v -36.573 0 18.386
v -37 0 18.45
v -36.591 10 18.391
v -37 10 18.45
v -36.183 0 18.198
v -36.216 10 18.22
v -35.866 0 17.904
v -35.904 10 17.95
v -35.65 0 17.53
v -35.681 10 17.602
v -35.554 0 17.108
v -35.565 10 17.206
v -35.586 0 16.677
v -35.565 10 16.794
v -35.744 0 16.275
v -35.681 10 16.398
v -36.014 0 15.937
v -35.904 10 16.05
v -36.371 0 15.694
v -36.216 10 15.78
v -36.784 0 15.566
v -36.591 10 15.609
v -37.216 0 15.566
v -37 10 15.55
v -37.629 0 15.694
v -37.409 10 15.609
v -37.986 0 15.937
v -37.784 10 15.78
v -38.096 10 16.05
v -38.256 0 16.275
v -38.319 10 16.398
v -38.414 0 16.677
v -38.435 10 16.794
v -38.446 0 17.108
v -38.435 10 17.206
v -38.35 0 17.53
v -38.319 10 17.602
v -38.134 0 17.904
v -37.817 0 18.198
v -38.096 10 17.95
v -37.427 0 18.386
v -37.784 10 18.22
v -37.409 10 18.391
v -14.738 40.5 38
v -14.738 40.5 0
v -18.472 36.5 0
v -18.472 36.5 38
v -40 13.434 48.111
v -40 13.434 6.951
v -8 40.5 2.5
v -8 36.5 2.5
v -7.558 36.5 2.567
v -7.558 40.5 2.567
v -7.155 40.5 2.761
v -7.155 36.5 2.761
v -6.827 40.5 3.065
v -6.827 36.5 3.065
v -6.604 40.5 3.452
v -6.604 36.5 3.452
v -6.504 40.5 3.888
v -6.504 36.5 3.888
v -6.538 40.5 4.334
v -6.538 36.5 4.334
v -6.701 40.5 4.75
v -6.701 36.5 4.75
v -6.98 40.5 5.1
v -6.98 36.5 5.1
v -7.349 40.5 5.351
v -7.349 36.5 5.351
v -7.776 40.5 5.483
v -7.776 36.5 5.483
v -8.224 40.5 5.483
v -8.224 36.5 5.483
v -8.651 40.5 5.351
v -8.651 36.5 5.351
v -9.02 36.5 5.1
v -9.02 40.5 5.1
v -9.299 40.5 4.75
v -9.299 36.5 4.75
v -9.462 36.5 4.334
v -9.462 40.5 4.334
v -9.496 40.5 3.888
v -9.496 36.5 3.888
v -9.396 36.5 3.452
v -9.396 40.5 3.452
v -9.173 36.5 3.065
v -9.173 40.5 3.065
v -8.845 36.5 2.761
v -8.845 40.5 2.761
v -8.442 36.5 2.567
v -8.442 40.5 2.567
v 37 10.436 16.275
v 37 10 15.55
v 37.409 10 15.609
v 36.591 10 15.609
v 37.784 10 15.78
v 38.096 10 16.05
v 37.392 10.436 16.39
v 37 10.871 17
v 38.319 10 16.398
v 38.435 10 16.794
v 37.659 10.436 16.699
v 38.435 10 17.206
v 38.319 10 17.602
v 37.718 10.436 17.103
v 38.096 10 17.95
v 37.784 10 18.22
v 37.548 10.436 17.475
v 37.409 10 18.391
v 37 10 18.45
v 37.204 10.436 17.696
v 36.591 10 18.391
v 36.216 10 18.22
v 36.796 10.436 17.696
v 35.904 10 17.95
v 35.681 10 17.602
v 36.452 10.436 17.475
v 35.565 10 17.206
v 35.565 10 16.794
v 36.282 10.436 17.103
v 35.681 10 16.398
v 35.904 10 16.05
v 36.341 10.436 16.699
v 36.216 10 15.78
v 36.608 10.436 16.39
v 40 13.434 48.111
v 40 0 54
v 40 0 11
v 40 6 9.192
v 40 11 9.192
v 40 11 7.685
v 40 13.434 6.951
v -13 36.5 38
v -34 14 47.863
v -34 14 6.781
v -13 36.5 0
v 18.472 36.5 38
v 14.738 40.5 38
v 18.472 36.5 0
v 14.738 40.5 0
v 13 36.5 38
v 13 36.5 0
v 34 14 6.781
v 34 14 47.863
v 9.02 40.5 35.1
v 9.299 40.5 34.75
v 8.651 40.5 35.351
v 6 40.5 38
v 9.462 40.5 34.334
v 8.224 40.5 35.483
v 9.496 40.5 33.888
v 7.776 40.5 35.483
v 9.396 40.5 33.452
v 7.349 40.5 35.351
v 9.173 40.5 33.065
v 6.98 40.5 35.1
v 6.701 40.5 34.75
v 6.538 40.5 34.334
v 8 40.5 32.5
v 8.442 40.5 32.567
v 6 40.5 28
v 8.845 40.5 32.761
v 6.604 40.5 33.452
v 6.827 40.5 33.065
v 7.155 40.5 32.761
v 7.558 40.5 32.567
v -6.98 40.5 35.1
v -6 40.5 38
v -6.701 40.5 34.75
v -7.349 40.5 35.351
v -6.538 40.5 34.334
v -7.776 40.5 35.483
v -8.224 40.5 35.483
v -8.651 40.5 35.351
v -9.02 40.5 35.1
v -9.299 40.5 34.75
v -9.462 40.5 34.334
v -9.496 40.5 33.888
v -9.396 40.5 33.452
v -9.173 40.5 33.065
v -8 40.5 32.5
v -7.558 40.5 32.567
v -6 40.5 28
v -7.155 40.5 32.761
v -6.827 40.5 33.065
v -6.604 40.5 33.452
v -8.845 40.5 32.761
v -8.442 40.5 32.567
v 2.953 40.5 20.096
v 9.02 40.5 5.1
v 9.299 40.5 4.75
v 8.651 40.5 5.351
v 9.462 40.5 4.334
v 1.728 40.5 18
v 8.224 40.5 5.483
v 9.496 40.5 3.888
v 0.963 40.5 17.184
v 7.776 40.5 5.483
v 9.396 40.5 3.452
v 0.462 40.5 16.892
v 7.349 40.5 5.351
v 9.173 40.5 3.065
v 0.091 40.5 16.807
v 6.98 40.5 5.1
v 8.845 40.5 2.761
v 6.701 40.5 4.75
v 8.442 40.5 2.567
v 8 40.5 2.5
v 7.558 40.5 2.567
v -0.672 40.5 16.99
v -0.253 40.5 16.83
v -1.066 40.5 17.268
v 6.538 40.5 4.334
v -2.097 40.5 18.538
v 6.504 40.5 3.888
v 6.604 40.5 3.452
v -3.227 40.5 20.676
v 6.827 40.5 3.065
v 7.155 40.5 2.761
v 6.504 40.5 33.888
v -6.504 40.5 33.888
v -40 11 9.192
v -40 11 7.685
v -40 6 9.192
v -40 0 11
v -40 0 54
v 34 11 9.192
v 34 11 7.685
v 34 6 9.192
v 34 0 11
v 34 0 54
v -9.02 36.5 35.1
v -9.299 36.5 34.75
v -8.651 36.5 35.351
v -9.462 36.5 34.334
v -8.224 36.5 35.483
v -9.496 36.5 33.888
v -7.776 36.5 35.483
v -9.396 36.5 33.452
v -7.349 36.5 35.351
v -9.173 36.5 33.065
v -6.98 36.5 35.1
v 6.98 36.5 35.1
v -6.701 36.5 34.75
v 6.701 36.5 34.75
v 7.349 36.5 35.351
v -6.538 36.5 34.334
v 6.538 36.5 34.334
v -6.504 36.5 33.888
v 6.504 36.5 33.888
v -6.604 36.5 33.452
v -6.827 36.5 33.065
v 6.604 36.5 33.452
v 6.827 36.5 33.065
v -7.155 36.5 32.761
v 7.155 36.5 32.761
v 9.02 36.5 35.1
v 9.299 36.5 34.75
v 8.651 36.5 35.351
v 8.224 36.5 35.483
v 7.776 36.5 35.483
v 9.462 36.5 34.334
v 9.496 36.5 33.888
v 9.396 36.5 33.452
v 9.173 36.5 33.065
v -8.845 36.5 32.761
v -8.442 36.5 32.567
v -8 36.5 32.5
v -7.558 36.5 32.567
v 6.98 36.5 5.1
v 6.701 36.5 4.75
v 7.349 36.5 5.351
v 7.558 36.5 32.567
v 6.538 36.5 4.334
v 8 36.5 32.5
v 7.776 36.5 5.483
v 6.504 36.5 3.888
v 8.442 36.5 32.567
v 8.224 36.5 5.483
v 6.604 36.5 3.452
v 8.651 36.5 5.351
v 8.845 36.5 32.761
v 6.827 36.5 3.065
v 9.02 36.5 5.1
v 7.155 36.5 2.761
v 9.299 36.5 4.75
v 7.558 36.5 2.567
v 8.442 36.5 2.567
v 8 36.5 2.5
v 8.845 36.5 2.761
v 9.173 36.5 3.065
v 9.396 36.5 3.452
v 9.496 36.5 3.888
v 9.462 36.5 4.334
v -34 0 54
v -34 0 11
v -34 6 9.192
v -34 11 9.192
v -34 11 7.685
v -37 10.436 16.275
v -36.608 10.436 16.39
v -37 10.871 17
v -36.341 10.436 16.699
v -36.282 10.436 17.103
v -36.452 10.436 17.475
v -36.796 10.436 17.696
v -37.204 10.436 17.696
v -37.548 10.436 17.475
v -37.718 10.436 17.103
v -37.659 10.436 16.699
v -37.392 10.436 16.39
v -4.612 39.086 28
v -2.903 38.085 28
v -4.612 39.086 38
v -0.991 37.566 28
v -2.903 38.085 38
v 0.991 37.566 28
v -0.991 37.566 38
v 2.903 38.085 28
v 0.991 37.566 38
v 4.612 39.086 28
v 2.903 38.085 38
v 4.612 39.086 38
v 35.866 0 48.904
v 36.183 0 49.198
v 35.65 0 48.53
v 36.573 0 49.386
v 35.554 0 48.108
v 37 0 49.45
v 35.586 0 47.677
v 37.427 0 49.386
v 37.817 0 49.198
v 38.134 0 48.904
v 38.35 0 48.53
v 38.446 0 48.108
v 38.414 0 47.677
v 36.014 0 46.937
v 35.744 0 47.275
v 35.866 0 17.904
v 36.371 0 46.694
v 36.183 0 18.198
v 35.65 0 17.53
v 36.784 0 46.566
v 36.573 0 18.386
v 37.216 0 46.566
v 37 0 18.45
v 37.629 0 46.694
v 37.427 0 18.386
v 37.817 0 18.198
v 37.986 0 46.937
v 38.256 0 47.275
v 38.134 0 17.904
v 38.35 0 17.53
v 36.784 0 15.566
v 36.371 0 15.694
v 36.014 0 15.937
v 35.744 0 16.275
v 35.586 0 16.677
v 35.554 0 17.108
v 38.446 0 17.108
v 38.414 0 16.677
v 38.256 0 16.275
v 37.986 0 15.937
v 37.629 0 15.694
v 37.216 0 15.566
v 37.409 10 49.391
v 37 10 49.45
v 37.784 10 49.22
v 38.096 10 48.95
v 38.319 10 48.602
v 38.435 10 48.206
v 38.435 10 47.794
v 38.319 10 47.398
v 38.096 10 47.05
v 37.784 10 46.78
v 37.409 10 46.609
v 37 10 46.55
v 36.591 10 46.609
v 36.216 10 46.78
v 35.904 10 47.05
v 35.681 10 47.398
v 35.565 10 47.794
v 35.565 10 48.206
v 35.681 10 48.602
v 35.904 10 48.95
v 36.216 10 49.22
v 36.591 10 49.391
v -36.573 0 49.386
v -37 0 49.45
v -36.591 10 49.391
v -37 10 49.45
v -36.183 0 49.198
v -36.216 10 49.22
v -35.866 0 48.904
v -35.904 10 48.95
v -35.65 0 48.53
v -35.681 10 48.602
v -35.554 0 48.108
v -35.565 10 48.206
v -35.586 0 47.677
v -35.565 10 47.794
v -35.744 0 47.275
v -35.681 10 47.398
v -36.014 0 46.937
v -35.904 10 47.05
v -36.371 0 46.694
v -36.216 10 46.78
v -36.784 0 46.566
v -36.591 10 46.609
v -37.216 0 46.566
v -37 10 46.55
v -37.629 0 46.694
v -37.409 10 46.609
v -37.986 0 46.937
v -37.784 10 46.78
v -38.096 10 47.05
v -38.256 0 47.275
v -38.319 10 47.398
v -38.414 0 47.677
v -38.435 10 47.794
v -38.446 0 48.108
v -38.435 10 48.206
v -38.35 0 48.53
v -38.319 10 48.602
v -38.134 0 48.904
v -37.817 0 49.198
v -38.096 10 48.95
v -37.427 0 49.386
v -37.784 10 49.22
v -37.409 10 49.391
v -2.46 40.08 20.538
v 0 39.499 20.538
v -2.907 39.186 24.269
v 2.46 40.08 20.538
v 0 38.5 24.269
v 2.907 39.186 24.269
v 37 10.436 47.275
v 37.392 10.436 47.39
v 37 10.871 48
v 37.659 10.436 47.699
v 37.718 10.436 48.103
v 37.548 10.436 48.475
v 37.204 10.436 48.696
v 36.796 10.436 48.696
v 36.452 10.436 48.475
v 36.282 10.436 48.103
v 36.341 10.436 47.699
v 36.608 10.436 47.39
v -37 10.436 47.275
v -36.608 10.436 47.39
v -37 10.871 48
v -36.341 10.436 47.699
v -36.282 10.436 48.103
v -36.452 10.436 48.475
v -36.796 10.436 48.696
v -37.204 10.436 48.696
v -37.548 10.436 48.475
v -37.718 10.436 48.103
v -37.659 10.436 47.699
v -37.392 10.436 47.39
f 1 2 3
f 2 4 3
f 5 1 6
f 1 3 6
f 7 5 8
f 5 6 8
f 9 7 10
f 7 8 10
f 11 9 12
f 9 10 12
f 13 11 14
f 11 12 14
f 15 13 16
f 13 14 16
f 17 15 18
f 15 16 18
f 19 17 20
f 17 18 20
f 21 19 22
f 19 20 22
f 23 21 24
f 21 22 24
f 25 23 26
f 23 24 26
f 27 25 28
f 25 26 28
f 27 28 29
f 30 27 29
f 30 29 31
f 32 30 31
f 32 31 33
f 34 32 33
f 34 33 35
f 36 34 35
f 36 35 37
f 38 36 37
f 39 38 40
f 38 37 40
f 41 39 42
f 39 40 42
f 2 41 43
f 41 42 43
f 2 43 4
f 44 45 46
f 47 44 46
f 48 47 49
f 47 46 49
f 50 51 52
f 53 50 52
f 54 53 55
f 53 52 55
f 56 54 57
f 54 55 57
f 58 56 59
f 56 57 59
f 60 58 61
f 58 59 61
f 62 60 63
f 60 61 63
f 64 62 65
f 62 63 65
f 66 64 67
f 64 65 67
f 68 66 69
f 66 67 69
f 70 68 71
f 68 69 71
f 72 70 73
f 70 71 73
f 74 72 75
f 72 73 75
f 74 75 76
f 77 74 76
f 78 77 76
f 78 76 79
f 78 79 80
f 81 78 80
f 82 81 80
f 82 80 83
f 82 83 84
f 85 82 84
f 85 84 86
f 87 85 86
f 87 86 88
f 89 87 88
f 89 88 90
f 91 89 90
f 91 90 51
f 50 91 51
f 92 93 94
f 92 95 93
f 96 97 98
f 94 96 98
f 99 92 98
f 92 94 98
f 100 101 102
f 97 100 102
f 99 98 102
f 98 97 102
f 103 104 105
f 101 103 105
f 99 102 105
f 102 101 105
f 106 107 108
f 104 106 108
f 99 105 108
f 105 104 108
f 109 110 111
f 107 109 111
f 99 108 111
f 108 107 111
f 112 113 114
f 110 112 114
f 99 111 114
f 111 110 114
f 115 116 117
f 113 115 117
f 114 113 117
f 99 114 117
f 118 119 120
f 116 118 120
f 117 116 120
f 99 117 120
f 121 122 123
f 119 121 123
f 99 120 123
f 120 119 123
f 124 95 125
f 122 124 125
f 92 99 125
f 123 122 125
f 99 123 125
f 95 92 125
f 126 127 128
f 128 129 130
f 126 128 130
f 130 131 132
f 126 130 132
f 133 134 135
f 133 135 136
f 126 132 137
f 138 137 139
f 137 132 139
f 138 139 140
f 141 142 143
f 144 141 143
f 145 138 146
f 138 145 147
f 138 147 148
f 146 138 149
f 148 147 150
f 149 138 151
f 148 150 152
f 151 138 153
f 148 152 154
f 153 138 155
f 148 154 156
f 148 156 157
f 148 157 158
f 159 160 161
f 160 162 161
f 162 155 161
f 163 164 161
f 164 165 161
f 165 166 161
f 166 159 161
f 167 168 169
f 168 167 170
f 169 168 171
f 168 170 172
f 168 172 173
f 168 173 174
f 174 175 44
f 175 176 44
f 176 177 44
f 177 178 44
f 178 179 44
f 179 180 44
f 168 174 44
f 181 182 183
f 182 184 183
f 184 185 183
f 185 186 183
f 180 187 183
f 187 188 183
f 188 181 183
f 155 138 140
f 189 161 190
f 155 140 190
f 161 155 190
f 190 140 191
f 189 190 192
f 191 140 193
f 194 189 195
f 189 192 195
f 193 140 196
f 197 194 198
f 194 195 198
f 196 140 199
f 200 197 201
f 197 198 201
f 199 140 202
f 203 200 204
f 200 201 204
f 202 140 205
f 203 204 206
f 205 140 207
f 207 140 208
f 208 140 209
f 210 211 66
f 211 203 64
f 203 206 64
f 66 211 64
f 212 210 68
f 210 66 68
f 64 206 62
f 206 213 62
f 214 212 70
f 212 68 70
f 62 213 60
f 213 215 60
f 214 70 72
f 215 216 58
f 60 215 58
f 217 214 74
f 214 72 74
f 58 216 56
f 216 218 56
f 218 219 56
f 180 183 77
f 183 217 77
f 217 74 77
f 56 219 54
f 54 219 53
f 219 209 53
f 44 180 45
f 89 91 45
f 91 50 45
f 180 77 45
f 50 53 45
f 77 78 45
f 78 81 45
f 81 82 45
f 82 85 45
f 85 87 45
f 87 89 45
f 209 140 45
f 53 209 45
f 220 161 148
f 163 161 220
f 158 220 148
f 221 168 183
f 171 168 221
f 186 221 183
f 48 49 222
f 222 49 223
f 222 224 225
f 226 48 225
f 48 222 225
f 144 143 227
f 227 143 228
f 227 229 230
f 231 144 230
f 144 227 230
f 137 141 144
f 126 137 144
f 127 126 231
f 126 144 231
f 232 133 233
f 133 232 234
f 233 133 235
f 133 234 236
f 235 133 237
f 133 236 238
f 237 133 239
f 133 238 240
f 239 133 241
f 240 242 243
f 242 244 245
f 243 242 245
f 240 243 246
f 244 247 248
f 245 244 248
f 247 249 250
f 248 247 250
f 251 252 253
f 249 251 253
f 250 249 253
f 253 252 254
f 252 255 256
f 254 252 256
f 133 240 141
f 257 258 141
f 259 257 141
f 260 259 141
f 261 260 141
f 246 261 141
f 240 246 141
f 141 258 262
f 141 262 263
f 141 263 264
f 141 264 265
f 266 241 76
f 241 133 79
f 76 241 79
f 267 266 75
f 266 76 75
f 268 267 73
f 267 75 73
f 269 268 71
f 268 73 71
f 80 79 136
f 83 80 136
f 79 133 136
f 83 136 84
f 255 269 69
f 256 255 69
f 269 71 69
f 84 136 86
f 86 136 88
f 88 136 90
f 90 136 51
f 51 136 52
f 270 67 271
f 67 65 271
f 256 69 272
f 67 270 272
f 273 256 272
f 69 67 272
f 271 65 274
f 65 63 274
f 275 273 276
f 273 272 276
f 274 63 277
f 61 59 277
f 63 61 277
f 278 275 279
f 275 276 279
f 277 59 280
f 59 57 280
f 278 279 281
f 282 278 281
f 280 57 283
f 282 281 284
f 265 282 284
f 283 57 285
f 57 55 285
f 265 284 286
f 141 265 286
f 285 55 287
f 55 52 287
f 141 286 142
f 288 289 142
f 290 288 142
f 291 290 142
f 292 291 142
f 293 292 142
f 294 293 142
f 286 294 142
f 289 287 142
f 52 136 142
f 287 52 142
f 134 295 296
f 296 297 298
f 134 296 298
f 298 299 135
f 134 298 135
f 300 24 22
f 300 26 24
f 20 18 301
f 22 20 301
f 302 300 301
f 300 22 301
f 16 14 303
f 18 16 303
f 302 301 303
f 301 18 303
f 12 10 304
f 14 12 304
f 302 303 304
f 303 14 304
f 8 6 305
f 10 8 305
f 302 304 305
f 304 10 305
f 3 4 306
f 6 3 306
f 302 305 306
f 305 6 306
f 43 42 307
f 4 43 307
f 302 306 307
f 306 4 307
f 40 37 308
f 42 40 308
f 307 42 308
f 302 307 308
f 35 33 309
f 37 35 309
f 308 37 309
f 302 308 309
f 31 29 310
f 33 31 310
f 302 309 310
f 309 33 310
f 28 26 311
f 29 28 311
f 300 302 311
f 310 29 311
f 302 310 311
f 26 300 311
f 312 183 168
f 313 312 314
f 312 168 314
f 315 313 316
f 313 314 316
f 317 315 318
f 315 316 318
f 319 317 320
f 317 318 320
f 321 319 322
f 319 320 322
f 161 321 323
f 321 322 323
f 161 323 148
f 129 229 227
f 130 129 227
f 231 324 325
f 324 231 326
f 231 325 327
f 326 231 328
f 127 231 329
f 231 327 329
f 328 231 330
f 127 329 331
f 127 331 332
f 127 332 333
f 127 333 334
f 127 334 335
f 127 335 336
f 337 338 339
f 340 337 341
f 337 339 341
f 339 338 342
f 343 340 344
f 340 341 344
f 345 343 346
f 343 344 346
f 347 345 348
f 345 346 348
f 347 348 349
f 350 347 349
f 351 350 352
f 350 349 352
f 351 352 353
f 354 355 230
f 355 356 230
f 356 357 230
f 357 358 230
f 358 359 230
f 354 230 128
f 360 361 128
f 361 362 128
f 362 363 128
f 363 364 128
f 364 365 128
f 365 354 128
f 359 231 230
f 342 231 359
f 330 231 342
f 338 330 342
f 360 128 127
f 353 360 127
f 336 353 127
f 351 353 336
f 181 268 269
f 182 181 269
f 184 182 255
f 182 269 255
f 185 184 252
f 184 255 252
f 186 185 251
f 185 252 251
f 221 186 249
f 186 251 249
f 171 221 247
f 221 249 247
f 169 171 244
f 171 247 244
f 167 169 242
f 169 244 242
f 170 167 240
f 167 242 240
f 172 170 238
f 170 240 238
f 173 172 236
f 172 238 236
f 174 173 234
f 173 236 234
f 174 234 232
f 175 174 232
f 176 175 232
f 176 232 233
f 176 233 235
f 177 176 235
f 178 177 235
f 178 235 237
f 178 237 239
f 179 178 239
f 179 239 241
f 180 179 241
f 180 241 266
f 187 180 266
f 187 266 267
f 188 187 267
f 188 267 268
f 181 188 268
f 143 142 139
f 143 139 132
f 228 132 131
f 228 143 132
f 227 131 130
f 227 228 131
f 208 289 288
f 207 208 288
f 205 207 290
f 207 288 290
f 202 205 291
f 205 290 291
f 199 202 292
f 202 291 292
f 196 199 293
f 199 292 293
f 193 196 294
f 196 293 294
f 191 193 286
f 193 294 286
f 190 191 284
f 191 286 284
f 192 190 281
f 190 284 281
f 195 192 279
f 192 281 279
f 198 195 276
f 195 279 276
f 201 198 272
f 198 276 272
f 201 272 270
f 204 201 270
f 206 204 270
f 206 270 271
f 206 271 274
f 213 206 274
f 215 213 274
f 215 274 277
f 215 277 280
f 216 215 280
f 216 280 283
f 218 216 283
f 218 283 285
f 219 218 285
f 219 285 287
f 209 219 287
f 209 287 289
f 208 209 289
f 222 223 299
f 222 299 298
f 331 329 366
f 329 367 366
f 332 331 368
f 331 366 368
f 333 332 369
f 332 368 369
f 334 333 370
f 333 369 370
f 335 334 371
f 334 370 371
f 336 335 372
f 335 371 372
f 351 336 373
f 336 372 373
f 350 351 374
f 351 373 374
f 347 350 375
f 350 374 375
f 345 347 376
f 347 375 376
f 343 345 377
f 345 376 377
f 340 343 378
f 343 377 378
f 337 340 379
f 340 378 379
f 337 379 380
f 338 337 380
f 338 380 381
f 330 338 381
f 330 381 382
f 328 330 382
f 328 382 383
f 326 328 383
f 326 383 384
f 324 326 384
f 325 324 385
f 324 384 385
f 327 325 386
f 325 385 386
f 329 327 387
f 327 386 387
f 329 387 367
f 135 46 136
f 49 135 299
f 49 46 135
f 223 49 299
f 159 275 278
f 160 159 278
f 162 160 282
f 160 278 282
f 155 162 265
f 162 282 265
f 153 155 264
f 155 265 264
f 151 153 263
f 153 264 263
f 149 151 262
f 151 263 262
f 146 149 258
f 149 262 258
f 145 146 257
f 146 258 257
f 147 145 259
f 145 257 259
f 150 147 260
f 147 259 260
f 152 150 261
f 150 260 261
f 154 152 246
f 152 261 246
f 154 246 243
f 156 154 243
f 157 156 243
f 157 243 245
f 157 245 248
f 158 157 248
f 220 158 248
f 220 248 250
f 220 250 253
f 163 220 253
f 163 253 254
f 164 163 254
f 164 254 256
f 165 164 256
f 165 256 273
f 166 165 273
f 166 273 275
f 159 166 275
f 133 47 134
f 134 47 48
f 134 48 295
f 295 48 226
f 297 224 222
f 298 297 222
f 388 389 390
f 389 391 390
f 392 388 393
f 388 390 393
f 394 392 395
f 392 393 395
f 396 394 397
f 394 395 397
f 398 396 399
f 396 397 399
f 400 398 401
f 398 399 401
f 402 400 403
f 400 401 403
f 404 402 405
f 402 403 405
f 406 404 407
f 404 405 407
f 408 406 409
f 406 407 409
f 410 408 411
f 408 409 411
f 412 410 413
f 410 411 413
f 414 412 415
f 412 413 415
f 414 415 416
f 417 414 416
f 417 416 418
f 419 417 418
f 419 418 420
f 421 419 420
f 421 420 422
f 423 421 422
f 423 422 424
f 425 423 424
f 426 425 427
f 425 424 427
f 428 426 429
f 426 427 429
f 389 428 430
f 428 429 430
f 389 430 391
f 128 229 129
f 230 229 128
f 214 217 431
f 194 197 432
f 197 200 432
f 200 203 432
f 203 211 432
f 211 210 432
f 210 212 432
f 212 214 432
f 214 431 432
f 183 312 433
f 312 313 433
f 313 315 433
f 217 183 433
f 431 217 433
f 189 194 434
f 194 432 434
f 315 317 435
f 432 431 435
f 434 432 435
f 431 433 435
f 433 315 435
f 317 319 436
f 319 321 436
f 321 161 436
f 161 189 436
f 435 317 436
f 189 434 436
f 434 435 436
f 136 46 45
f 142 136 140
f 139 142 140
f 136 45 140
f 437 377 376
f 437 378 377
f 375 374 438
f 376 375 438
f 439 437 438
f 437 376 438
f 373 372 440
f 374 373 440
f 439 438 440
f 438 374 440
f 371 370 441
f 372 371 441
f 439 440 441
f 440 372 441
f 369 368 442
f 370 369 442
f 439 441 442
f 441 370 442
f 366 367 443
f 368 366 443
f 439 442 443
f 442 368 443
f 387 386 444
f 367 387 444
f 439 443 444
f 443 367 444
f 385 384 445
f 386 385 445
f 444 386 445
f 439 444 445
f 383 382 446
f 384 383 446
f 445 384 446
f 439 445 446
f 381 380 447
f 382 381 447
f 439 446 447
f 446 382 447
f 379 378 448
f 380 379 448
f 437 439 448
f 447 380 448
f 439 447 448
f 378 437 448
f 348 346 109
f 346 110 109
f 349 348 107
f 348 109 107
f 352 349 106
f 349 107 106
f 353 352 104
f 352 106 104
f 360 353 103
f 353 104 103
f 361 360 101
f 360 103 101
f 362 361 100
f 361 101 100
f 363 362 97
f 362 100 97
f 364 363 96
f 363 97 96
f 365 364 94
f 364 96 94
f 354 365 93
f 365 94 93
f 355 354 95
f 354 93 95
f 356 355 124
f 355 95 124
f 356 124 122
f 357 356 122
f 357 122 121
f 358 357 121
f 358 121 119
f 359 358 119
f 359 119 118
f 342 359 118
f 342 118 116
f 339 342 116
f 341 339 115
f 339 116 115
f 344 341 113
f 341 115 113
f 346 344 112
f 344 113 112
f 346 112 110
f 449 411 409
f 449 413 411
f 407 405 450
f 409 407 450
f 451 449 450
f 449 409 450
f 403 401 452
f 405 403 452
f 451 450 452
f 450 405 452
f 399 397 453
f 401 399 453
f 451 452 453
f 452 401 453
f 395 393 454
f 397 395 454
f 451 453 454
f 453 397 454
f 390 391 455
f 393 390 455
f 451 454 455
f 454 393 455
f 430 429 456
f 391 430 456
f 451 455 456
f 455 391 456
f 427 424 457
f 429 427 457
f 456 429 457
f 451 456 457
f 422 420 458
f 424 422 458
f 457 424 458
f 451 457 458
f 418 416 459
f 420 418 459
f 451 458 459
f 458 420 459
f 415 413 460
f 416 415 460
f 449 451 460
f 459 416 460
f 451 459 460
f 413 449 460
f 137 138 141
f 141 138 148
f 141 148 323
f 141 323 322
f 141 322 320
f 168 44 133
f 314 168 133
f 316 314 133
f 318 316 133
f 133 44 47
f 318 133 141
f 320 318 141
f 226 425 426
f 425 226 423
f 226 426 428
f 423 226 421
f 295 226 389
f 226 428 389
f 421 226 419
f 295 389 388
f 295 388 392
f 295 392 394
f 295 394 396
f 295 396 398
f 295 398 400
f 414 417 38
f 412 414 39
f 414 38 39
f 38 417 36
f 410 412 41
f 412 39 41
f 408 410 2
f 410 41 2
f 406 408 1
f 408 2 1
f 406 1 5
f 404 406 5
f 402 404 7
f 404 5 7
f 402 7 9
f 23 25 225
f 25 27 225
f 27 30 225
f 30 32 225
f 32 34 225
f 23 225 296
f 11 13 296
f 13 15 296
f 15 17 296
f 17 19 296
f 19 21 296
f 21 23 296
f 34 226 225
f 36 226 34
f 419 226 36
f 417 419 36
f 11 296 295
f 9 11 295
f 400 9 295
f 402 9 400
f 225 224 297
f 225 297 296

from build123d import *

# Parameters (mm, degrees)
BOSS_EXTRUDE1_DEPTH       = 54
CUT_EXTRUDE1_DEPTH        = 79.461774132
CUT_EXTRUDE1_DEPTH_BACK   = 79.461774132
F_3_0MM_DOWEL_HOLE1_D     = 3
F_3_0MM_DOWEL_HOLE2_D     = 2.9
F_3_0MM_DOWEL_HOLE2_DEPTH = 10
F_3_0MM_DOWEL_HOLE2_TIP   = 0.871247898
SKETCH8_W                 = 2.769274519
SKETCH8_H                 = 5
CUT_EXTRUDE2_DEPTH        = 105.672107077
SKETCH10_R                = 7.5
CUT_EXTRUDE3_DEPTH        = 10
SKETCH11_R                = 7.5
CUT_EXTRUDE4_DEPTH        = 15
CUT_EXTRUDE4_DRAFT        = -15


with BuildPart() as part:
    # Sketch1 → Boss-Extrude1 (new body)
    with BuildSketch(Plane.XY):
        Polygon((14.738209208, 40.5), (-14.738209208, 40.5), (-40, 13.43379558), (-40, 0), (-34, 0), (-34, 14), (-13, 36.5), (13, 36.5), (34, 14), (34, 0), (40, 0), (40, 13.43379558), align=None)
    extrude(amount=BOSS_EXTRUDE1_DEPTH)

    # Sketch2 → Cut-Extrude1 (cut, two sides: drawn at the far end of the back side and taken through both)
    with BuildSketch(Plane(origin=(0, 0, 0), x_dir=(0, 0, -1), z_dir=(1, 0, 0)).offset(-CUT_EXTRUDE1_DEPTH_BACK)):
        Polygon((0, 36.5), (-11, 0), (0, 0), align=None)
        Polygon((-38, 40.5), (-38, 36.5), (-54, 0), (-54, 40.5), align=None)
    extrude(amount=CUT_EXTRUDE1_DEPTH + CUT_EXTRUDE1_DEPTH_BACK, mode=Mode.SUBTRACT)

    # Ø3.0mm Dowel Hole1 (through all)
    with Locations(Plane(origin=(-8, 40.5, 4), x_dir=(0, 0, 1), z_dir=(0, 1, 0))):
        with Locations((0, 0), (0, 16), (30, 16), (30, 0)):
            Hole(F_3_0MM_DOWEL_HOLE1_D / 2)

    # Ø3.0mm Dowel Hole2
    with Locations(Plane(origin=(-37, 0, 48), x_dir=(0, 0, -1), z_dir=(0, -1, 0))):
        with Locations((0, 0), (0, 74), (31, 74), (31, 0)):
            Hole(F_3_0MM_DOWEL_HOLE2_D / 2, depth=F_3_0MM_DOWEL_HOLE2_DEPTH)
            with Locations((0, 0, -(F_3_0MM_DOWEL_HOLE2_DEPTH + F_3_0MM_DOWEL_HOLE2_TIP / 2))):  # 118° drill point
                Cone(0, F_3_0MM_DOWEL_HOLE2_D / 2, F_3_0MM_DOWEL_HOLE2_TIP, mode=Mode.SUBTRACT)

    # Sketch8 → Cut-Extrude2 (cut, through all)
    with BuildSketch(Plane.ZY.offset(40)):
        with Locations((7.807143563, 8.5)):
            Rectangle(SKETCH8_W, SKETCH8_H)
    extrude(amount=-CUT_EXTRUDE2_DEPTH, mode=Mode.SUBTRACT)

    # Sketch10 → Cut-Extrude3 (cut)
    with BuildSketch(Plane.XY.offset(38)):
        with Locations((0, 45)):
            Circle(SKETCH10_R)
    extrude(amount=-CUT_EXTRUDE3_DEPTH, mode=Mode.SUBTRACT)


with BuildPart() as cut_extrude4_tool:
    # Sketch11 → Cut-Extrude4 (with draft: the straight prism first)
    with BuildSketch(Plane.XY.offset(28)):
        with Locations((0, 45)):
            Circle(SKETCH11_R)
    extrude(amount=-CUT_EXTRUDE4_DEPTH)
    # Cut-Extrude4: the draft: its side faces are tilted about the plane it starts from
    cut_extrude4_sides = [cut_extrude4_tool.faces().sort_by_distance(p)[0] for p in [
        (-7.5, 45, 20.5),
    ]]
    draft(cut_extrude4_sides, Plane.XY.offset(28), CUT_EXTRUDE4_DRAFT)


with BuildPart() as part_1:
    add(part.part)

    # Cut-Extrude4: cut by cut_extrude4_tool
    add(cut_extrude4_tool.part, mode=Mode.SUBTRACT)


solid = part_1.part
